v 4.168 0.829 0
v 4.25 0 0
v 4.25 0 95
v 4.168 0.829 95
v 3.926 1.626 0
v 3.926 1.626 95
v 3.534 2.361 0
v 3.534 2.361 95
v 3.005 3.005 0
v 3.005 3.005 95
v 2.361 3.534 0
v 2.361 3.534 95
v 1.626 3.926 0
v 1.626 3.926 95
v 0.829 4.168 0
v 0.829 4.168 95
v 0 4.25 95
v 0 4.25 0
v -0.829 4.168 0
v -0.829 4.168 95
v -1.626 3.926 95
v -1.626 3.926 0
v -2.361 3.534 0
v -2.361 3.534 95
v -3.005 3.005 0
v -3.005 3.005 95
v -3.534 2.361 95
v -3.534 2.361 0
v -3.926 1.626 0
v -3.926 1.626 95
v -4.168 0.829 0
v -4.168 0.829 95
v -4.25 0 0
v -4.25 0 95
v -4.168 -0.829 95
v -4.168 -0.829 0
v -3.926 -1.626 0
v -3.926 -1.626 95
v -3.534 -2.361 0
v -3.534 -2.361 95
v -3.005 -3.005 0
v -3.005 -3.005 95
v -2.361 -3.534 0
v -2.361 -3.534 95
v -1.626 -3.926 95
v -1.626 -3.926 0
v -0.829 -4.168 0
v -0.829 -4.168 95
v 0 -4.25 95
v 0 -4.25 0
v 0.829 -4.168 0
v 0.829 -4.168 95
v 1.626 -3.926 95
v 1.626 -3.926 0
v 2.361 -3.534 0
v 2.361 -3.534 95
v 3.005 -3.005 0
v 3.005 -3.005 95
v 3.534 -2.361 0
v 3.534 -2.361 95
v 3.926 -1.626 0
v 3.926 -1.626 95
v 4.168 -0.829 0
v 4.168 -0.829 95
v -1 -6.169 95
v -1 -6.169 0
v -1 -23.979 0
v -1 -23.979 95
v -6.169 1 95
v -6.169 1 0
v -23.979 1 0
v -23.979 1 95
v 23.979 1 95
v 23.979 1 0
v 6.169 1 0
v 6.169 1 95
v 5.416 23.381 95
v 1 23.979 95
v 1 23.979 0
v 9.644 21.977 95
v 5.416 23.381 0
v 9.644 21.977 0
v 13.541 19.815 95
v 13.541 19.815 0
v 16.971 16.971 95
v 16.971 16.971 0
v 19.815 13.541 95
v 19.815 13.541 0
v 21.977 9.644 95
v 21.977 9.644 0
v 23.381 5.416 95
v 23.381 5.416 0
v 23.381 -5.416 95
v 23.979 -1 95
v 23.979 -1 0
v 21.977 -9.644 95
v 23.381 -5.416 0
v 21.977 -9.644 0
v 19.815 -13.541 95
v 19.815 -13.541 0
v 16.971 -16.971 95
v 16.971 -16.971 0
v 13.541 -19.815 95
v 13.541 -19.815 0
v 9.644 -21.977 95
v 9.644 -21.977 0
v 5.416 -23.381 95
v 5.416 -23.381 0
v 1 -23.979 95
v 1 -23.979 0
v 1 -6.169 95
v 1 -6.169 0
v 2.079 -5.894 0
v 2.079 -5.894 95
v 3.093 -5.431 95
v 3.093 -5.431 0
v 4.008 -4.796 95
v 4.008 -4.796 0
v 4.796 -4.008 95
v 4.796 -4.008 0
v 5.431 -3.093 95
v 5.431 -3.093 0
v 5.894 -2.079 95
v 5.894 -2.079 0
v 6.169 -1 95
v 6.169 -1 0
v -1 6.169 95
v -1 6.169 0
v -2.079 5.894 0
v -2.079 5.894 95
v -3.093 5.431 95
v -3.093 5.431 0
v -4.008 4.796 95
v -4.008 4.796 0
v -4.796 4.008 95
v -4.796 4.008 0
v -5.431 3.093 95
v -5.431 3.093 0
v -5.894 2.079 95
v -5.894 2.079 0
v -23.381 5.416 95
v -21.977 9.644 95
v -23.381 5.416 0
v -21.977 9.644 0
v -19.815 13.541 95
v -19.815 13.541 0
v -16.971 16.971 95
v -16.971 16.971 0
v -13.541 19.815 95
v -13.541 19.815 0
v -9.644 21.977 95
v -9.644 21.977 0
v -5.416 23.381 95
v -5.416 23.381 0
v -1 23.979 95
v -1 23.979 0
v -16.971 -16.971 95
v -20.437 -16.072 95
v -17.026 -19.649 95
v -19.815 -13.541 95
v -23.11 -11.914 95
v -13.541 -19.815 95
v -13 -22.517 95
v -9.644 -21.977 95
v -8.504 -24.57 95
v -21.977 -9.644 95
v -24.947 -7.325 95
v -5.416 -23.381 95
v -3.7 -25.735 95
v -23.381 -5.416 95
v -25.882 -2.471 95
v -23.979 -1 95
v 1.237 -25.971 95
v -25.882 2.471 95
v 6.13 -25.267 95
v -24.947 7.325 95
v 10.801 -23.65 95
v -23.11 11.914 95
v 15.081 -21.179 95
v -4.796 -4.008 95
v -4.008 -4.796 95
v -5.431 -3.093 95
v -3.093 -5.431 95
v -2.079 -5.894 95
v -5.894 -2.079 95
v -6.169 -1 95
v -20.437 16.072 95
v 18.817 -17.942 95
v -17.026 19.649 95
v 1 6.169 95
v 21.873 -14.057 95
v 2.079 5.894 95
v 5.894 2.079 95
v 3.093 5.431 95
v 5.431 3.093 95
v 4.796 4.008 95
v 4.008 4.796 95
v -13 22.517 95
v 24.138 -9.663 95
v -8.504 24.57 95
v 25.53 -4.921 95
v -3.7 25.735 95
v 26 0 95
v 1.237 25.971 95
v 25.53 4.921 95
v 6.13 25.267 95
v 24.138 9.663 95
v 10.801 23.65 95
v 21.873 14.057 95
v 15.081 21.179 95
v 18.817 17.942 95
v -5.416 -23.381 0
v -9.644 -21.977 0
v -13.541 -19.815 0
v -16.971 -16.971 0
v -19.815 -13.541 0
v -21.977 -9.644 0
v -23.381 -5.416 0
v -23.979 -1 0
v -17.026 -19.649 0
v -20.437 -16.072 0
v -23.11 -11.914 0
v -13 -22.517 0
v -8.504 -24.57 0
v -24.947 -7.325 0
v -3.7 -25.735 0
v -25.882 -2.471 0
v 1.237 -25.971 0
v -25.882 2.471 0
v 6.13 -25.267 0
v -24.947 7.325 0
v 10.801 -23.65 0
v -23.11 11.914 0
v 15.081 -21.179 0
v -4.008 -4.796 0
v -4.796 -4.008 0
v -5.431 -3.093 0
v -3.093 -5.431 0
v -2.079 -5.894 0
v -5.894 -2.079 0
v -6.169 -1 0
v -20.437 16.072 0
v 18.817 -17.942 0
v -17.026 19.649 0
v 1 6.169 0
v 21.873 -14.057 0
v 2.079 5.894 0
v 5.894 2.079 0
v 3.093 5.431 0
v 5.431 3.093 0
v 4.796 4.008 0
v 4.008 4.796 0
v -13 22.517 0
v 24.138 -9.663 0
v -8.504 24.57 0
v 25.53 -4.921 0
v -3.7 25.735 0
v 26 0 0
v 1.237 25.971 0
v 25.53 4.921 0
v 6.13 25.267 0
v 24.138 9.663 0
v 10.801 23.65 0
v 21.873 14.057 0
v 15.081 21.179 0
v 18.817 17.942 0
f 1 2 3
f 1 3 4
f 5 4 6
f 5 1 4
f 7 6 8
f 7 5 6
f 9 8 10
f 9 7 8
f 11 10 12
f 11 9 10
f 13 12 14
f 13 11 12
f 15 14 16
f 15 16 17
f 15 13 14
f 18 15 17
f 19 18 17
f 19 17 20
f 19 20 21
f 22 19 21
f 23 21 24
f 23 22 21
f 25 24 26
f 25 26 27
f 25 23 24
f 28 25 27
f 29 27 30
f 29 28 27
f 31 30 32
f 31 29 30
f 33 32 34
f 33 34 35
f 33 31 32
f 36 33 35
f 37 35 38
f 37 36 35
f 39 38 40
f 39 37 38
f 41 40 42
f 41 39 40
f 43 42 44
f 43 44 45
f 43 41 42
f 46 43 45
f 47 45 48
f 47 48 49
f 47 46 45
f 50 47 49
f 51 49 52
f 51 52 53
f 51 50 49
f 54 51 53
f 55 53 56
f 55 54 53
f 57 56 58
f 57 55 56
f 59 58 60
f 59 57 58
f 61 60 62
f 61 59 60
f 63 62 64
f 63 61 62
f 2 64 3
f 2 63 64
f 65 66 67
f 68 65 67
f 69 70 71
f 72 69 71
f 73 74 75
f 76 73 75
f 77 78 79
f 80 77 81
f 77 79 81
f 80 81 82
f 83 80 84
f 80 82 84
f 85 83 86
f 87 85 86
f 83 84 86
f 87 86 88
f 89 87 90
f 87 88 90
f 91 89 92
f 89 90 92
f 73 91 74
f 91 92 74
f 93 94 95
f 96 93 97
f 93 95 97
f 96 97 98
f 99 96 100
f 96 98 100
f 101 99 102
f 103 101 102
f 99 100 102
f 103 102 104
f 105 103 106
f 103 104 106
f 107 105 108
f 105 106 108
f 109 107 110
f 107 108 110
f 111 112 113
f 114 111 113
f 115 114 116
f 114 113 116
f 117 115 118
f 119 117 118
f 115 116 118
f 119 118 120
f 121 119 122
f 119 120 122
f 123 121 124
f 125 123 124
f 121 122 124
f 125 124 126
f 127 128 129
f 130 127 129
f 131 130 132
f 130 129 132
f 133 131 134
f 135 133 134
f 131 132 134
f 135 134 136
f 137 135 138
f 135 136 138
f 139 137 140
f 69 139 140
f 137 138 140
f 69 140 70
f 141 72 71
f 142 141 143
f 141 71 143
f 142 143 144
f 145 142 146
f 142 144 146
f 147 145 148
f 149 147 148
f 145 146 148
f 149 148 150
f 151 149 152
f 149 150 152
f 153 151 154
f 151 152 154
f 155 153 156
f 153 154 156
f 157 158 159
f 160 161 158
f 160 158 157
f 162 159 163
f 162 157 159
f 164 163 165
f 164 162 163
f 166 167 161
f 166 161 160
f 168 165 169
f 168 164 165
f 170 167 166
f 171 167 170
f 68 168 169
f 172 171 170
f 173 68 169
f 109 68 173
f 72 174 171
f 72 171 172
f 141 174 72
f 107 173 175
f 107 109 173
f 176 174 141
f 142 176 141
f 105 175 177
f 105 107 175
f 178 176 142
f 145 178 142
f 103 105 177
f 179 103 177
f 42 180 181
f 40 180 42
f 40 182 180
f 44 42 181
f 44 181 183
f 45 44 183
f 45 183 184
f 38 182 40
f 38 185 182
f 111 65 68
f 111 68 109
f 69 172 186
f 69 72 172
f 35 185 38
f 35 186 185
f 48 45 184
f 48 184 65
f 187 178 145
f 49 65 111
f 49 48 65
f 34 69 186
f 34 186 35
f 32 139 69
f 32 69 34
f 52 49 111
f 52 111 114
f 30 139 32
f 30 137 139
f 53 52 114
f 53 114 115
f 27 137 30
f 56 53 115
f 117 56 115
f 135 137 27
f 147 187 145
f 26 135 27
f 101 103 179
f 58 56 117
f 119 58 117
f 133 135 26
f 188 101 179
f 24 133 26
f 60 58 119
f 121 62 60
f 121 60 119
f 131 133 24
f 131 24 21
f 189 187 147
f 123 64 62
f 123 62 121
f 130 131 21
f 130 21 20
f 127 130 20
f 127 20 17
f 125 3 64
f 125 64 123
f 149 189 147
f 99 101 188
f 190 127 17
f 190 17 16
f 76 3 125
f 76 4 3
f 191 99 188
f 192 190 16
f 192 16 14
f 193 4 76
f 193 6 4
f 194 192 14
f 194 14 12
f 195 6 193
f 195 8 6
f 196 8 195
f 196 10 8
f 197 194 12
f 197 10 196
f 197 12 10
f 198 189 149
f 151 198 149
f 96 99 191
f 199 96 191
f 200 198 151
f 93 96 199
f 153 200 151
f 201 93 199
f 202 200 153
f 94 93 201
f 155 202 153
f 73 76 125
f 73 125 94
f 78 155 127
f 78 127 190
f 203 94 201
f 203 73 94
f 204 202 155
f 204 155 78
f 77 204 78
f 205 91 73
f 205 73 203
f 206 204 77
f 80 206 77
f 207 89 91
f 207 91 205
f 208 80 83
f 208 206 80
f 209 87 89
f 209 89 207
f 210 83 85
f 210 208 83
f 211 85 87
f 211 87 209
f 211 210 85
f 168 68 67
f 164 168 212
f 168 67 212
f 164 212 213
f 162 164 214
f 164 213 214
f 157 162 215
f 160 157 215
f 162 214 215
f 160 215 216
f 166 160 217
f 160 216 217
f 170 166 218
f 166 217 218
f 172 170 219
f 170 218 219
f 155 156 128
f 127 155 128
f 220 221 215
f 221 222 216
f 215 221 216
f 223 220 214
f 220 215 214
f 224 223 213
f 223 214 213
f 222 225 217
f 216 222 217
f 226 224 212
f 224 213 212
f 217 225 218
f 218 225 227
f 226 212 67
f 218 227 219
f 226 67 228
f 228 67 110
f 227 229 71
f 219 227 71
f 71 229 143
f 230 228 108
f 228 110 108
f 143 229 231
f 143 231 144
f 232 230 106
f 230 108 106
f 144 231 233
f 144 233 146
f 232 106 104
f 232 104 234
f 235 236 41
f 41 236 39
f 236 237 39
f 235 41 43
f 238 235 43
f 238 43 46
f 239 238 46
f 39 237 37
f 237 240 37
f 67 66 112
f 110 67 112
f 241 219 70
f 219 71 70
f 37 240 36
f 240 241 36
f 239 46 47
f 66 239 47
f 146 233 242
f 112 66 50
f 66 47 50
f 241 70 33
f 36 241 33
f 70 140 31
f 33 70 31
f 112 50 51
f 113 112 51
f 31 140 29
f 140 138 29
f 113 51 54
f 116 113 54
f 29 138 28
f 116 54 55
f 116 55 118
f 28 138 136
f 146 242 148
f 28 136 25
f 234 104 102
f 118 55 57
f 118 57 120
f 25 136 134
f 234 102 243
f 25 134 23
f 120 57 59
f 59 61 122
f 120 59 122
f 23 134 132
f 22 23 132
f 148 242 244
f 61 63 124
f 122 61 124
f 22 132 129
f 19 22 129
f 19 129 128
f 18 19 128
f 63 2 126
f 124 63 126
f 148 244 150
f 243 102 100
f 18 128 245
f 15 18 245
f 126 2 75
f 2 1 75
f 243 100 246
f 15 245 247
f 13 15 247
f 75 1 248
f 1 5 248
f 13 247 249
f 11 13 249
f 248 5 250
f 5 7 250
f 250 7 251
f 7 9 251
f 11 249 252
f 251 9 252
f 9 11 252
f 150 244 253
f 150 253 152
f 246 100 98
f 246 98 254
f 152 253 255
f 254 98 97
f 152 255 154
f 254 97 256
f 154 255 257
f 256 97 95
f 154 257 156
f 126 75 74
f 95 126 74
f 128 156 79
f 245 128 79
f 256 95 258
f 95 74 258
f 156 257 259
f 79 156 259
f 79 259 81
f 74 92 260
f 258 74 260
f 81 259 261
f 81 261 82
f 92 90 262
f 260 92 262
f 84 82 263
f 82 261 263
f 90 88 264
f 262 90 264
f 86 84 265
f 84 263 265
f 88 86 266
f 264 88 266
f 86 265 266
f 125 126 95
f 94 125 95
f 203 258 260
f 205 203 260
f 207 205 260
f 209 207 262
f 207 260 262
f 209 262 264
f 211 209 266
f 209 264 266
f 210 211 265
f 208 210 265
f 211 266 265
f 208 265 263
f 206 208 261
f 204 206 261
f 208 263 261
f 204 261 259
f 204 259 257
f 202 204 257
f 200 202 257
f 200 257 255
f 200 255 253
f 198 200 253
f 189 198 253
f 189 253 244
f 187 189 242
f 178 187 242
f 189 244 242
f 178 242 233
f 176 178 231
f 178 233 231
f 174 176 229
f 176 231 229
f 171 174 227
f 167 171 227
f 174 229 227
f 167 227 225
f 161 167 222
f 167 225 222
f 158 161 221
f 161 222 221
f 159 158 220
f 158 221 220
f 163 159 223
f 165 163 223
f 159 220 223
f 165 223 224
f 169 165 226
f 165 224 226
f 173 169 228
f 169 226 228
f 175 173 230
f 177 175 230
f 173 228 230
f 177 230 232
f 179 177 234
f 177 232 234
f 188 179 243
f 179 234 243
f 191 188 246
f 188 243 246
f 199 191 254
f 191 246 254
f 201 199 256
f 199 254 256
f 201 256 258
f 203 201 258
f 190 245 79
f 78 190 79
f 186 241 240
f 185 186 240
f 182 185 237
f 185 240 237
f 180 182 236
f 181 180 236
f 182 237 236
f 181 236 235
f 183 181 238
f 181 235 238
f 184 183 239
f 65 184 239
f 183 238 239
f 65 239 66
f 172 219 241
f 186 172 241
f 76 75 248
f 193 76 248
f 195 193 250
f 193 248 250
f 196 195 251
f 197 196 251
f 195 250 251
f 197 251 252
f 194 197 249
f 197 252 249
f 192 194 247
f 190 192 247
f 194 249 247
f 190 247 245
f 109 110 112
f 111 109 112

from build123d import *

# Parameters (mm, degrees)
F0_R     = 26
F0_R_2   = 4.25
F1_DEPTH = 95


with BuildPart() as f1:
    # F0 (on Top) → F1 (new body)
    with BuildSketch(Plane.XY):
        Circle(F0_R)
        with BuildLine():
            ThreePointArc((1, 23.9791576166), (16.9705627485, 16.9705627485), (23.9791576166, 1))
            Line((23.9791576166, 1), (25, 1))
            Line((25, 1), (25, -1))
            Line((25, -1), (23.9791576166, -1))
            ThreePointArc((23.9791576166, -1), (16.9705627485, -16.9705627485), (1, -23.9791576166))
            Line((1, -23.9791576166), (1, -25))
            Line((1, -25), (-1, -25))
            Line((-1, -25), (-1, -23.9791576166))
            ThreePointArc((-1, -23.9791576166), (-16.9705627485, -16.9705627485), (-23.9791576166, -1))
            Line((-23.9791576166, -1), (-25, -1))
            Line((-25, -1), (-25, 1))
            Line((-25, 1), (-23.9791576166, 1))
            ThreePointArc((-23.9791576166, 1), (-16.9705627485, 16.9705627485), (-1, 23.9791576166))
            Line((-1, 23.9791576166), (-1, 25))
            Line((-1, 25), (1, 25))
            Line((1, 25), (1, 23.9791576166))
        make_face(mode=Mode.SUBTRACT)
        with BuildLine():
            ThreePointArc((-23.9791576166, -1), (-24, 0), (-23.9791576166, 1))
            Line((-23.9791576166, 1), (-25, 1))
            Line((-25, 1), (-25, -1))
            Line((-25, -1), (-23.9791576166, -1))
        make_face()
        with BuildLine():
            Line((1, -25), (1, -23.9791576166))
            ThreePointArc((1, -23.9791576166), (0, -24), (-1, -23.9791576166))
            Line((-1, -23.9791576166), (-1, -25))
            Line((-1, -25), (1, -25))
        make_face()
        with BuildLine():
            ThreePointArc((-1, -23.9791576166), (0, -24), (1, -23.9791576166))
            Line((1, -23.9791576166), (1, -6.1694813396))
            ThreePointArc((1, -6.1694813396), (0, -6.25), (-1, -6.1694813396))
            Line((-1, -6.1694813396), (-1, -23.9791576166))
        make_face()
        with BuildLine():
            Line((-6.1694813396, 1), (-23.9791576166, 1))
            ThreePointArc((-23.9791576166, 1), (-24, 0), (-23.9791576166, -1))
            Line((-23.9791576166, -1), (-6.1694813396, -1))
            ThreePointArc((-6.1694813396, -1), (-6.25, 0), (-6.1694813396, 1))
        make_face()
        with BuildLine():
            Line((-5, 1), (-6.1694813396, 1))
            ThreePointArc((-6.1694813396, 1), (-6.25, 0), (-6.1694813396, -1))
            Line((-6.1694813396, -1), (-5, -1))
            Line((-5, -1), (-5, 1))
        make_face()
        with BuildLine():
            ThreePointArc((23.9791576166, -1), (23.9947888384, -0.5001085894), (24, 0))
            ThreePointArc((24, 0), (23.9947888384, 0.5001085894), (23.9791576166, 1))
            Line((23.9791576166, 1), (6.1694813396, 1))
            ThreePointArc((6.1694813396, 1), (6.2298378138, 0.5016181951), (6.25, 0))
            ThreePointArc((6.25, 0), (6.2298378138, -0.5016181951), (6.1694813396, -1))
            Line((6.1694813396, -1), (23.9791576166, -1))
        make_face()
        with BuildLine():
            ThreePointArc((23.9791576166, 1), (23.9947888384, 0.5001085894), (24, 0))
            ThreePointArc((24, 0), (23.9947888384, -0.5001085894), (23.9791576166, -1))
            Line((23.9791576166, -1), (25, -1))
            Line((25, -1), (25, 1))
            Line((25, 1), (23.9791576166, 1))
        make_face()
        with BuildLine():
            Line((1, 6.1694813396), (1, 23.9791576166))
            ThreePointArc((1, 23.9791576166), (0, 24), (-1, 23.9791576166))
            Line((-1, 23.9791576166), (-1, 6.1694813396))
            ThreePointArc((-1, 6.1694813396), (0, 6.25), (1, 6.1694813396))
        make_face()
        with BuildLine():
            ThreePointArc((-1, 23.9791576166), (0, 24), (1, 23.9791576166))
            Line((1, 23.9791576166), (1, 25))
            Line((1, 25), (-1, 25))
            Line((-1, 25), (-1, 23.9791576166))
        make_face()
        with BuildLine():
            Line((1, 5), (1, 6.1694813396))
            ThreePointArc((1, 6.1694813396), (0, 6.25), (-1, 6.1694813396))
            Line((-1, 6.1694813396), (-1, 5))
            Line((-1, 5), (1, 5))
        make_face()
        with BuildLine():
            ThreePointArc((6.25, 0), (6.2298378138, 0.5016181951), (6.1694813396, 1))
            Line((6.1694813396, 1), (5, 1))
            Line((5, 1), (5, -1))
            Line((5, -1), (6.1694813396, -1))
            ThreePointArc((6.1694813396, -1), (6.2298378138, -0.5016181951), (6.25, 0))
        make_face()
        with BuildLine():
            Line((5, 1), (6.1694813396, 1))
            ThreePointArc((6.1694813396, 1), (4.4194173824, 4.4194173824), (1, 6.1694813396))
            Line((1, 6.1694813396), (1, 5))
            Line((1, 5), (-1, 5))
            Line((-1, 5), (-1, 6.1694813396))
            ThreePointArc((-1, 6.1694813396), (-4.4194173824, 4.4194173824), (-6.1694813396, 1))
            Line((-6.1694813396, 1), (-5, 1))
            Line((-5, 1), (-5, -1))
            Line((-5, -1), (-6.1694813396, -1))
            ThreePointArc((-6.1694813396, -1), (-4.4194173824, -4.4194173824), (-1, -6.1694813396))
            Line((-1, -6.1694813396), (-1, -5))
            Line((-1, -5), (1, -5))
            Line((1, -5), (1, -6.1694813396))
            ThreePointArc((1, -6.1694813396), (4.4194173824, -4.4194173824), (6.1694813396, -1))
            Line((6.1694813396, -1), (5, -1))
            Line((5, -1), (5, 1))
        make_face()
        Circle(F0_R_2, mode=Mode.SUBTRACT)
        with BuildLine():
            ThreePointArc((-1, -6.1694813396), (0, -6.25), (1, -6.1694813396))
            Line((1, -6.1694813396), (1, -5))
            Line((1, -5), (-1, -5))
            Line((-1, -5), (-1, -6.1694813396))
        make_face()
    extrude(amount=F1_DEPTH)


solid = f1.part
